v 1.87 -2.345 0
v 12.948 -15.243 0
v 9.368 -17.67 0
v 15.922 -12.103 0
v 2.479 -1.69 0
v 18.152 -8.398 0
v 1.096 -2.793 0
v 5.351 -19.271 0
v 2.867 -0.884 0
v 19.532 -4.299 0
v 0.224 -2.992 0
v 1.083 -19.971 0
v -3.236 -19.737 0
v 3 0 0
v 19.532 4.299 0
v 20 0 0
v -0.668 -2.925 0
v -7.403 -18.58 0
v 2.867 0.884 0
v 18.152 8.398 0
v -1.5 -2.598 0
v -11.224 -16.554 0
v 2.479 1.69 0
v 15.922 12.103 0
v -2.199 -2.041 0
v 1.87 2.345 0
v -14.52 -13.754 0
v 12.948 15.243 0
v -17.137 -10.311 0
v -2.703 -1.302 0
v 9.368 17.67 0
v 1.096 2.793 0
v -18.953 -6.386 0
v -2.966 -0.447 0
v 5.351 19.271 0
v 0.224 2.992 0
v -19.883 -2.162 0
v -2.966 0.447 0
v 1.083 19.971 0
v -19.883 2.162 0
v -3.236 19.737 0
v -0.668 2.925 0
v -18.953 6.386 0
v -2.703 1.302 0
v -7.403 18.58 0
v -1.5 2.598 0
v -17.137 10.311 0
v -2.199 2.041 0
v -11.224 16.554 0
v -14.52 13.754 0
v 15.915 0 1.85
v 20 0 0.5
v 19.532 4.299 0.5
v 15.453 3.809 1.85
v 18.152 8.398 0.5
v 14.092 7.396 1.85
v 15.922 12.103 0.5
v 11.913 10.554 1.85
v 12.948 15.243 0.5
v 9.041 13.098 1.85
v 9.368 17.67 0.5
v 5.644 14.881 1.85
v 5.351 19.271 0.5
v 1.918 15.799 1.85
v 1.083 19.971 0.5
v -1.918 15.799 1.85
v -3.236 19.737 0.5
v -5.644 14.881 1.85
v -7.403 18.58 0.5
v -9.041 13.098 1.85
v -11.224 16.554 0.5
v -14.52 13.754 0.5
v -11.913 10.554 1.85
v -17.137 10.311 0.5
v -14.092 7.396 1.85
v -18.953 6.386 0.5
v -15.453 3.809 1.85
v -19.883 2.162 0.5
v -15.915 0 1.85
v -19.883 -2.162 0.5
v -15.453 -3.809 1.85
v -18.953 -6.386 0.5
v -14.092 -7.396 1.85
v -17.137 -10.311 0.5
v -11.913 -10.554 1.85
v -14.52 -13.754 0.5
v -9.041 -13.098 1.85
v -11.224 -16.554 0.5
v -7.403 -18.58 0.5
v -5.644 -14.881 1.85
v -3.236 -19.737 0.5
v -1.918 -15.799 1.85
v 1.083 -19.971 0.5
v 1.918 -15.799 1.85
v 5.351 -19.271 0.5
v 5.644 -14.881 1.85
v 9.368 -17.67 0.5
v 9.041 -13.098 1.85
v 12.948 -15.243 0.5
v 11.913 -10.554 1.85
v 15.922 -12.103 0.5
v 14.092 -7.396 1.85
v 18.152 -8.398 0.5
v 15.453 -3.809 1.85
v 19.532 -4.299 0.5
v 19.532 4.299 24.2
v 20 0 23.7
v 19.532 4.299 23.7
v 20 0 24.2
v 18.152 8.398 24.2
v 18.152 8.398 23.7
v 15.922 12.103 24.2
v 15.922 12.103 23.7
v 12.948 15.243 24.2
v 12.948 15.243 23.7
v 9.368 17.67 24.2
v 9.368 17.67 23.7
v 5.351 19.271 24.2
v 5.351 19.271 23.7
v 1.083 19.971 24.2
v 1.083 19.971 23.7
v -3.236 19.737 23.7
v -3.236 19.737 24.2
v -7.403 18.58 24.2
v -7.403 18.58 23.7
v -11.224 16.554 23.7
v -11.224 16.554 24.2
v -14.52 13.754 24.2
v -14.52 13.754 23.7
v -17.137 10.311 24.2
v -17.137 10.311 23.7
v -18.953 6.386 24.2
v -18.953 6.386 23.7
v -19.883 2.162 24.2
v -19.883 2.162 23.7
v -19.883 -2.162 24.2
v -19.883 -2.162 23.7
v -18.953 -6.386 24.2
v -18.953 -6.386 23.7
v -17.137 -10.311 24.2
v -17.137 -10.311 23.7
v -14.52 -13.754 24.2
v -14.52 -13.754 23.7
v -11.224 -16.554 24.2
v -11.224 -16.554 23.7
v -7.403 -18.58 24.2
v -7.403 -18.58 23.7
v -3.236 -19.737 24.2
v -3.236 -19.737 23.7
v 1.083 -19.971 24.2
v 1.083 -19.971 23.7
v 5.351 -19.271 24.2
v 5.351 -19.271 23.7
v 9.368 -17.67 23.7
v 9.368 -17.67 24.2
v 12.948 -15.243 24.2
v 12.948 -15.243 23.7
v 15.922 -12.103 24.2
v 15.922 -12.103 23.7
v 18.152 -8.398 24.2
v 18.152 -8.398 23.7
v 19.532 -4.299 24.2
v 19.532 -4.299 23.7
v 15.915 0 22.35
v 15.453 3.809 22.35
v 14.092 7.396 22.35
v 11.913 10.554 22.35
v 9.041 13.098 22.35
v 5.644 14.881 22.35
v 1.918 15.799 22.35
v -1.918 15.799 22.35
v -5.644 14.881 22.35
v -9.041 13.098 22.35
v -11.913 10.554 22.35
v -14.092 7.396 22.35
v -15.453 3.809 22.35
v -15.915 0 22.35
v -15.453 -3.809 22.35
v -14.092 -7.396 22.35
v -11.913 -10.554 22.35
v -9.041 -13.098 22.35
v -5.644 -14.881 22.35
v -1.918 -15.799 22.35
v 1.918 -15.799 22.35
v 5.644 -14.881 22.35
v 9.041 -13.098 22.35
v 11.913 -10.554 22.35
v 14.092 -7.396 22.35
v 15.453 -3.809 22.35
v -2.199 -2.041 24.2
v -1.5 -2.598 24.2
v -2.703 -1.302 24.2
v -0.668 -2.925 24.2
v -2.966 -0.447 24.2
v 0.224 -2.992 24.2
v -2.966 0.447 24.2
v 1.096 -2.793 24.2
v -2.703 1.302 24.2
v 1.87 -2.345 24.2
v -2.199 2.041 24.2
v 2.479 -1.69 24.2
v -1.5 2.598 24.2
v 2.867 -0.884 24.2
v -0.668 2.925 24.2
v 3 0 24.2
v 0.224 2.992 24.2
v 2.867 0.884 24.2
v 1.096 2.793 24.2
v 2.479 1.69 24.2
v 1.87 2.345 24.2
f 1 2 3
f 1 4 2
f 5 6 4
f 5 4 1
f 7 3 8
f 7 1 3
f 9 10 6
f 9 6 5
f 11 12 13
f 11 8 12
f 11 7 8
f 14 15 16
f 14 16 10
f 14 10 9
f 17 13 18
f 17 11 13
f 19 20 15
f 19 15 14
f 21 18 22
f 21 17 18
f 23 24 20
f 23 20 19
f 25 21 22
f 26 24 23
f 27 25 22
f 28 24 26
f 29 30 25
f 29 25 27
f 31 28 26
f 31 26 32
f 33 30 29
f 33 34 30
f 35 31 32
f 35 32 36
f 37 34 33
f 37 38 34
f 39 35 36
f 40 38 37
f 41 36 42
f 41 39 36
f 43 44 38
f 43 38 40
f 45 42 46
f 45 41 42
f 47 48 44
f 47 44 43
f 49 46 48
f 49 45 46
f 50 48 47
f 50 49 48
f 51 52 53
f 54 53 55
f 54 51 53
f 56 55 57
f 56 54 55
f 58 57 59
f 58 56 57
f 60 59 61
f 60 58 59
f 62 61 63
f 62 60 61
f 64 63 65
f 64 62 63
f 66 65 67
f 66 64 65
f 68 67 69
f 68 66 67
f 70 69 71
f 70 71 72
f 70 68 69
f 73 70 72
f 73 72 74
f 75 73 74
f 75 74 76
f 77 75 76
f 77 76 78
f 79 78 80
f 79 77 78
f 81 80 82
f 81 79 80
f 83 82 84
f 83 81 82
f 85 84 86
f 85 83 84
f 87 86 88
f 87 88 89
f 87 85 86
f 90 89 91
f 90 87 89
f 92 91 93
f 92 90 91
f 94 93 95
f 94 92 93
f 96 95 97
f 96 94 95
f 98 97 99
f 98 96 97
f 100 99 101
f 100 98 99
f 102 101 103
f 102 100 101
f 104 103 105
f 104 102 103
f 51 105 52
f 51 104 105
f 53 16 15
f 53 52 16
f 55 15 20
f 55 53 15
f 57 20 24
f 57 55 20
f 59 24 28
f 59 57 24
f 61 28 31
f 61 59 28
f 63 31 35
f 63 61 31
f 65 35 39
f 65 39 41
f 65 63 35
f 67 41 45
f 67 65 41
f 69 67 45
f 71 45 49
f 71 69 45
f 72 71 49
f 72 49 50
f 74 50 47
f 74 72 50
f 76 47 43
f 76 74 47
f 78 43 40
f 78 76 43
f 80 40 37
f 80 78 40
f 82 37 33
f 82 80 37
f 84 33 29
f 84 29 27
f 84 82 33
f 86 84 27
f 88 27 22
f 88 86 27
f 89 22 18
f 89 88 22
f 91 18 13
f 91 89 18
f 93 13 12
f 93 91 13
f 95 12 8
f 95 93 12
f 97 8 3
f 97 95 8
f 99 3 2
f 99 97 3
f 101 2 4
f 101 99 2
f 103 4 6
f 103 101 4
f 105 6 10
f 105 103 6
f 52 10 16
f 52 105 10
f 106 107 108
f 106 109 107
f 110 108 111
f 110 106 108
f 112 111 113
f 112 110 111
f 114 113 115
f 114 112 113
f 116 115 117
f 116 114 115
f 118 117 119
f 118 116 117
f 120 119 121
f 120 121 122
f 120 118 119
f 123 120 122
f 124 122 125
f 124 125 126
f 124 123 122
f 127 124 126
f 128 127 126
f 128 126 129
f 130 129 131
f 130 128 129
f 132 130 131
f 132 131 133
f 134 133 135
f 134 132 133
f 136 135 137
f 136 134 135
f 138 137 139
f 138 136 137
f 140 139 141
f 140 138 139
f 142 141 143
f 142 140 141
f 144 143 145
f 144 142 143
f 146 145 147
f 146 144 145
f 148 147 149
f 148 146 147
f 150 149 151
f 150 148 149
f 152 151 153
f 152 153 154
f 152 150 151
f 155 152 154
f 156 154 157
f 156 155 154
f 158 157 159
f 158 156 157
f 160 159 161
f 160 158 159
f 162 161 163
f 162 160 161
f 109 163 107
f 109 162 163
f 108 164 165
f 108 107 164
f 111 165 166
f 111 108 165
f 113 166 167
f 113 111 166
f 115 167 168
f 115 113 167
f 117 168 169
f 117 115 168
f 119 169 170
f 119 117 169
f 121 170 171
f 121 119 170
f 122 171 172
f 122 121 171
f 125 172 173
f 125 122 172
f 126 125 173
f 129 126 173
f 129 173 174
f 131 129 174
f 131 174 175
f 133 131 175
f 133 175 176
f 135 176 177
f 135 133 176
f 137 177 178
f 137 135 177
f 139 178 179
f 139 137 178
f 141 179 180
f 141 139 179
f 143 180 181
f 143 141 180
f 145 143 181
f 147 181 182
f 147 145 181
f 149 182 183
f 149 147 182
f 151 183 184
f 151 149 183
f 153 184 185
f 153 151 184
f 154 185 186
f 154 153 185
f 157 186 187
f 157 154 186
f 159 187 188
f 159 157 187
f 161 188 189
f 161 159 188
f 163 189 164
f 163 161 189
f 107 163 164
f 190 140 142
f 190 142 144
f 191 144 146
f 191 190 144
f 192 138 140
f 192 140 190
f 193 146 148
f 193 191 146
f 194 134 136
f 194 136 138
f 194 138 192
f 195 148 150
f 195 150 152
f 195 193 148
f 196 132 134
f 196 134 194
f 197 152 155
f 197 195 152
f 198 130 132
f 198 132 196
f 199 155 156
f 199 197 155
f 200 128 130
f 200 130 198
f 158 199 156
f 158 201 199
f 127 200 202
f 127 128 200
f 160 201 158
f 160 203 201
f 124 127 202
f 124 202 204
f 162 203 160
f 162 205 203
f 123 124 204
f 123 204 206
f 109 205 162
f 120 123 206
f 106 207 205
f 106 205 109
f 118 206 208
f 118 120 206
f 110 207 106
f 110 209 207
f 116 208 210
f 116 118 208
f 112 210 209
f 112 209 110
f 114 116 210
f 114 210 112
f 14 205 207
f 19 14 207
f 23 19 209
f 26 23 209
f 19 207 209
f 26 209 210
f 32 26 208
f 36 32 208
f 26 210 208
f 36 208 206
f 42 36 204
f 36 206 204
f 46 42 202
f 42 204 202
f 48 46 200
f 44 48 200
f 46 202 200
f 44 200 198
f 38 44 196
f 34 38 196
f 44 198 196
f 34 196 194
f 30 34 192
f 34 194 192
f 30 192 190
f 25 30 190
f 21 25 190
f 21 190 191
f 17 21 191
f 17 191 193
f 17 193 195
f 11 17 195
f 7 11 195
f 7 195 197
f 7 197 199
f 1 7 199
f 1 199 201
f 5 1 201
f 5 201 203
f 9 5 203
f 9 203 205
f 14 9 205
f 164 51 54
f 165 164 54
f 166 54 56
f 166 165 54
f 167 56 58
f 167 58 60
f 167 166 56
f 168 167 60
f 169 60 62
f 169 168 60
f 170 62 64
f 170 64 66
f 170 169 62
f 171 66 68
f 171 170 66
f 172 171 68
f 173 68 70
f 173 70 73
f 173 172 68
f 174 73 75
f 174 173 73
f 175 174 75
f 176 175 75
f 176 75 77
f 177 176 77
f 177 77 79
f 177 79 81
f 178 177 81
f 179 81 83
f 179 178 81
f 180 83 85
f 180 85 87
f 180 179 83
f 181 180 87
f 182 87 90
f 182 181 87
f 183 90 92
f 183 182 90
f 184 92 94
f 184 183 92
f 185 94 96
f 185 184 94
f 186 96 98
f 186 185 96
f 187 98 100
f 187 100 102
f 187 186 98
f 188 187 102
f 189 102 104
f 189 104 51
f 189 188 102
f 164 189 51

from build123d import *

# Parameters (mm, degrees)
SKETCH_3_R          = 3
CUT_EXTRUDE_1_DEPTH = 25.2


with BuildPart() as part:
    # 草圖2 → 旋轉1 (revolve)
    with BuildSketch(Plane(origin=(0, 0, 0), x_dir=(1, 0, 0), z_dir=(0, 1, 0))):
        Polygon((20, -0.5), (15.915, -1.85), (15.915, -22.35), (20, -23.7), (20, -24.2), (0, -24.2), (0, 0), (20, 0), align=None)
    revolve(axis=Axis((0, 0, 0), (0, 0, 1)))

    # 草圖3 → 除料-伸長1 (cut, through all)
    with BuildSketch(Plane.XY.offset(24.2)):
        Circle(SKETCH_3_R)
    extrude(amount=-CUT_EXTRUDE_1_DEPTH, mode=Mode.SUBTRACT)


solid = part.part
